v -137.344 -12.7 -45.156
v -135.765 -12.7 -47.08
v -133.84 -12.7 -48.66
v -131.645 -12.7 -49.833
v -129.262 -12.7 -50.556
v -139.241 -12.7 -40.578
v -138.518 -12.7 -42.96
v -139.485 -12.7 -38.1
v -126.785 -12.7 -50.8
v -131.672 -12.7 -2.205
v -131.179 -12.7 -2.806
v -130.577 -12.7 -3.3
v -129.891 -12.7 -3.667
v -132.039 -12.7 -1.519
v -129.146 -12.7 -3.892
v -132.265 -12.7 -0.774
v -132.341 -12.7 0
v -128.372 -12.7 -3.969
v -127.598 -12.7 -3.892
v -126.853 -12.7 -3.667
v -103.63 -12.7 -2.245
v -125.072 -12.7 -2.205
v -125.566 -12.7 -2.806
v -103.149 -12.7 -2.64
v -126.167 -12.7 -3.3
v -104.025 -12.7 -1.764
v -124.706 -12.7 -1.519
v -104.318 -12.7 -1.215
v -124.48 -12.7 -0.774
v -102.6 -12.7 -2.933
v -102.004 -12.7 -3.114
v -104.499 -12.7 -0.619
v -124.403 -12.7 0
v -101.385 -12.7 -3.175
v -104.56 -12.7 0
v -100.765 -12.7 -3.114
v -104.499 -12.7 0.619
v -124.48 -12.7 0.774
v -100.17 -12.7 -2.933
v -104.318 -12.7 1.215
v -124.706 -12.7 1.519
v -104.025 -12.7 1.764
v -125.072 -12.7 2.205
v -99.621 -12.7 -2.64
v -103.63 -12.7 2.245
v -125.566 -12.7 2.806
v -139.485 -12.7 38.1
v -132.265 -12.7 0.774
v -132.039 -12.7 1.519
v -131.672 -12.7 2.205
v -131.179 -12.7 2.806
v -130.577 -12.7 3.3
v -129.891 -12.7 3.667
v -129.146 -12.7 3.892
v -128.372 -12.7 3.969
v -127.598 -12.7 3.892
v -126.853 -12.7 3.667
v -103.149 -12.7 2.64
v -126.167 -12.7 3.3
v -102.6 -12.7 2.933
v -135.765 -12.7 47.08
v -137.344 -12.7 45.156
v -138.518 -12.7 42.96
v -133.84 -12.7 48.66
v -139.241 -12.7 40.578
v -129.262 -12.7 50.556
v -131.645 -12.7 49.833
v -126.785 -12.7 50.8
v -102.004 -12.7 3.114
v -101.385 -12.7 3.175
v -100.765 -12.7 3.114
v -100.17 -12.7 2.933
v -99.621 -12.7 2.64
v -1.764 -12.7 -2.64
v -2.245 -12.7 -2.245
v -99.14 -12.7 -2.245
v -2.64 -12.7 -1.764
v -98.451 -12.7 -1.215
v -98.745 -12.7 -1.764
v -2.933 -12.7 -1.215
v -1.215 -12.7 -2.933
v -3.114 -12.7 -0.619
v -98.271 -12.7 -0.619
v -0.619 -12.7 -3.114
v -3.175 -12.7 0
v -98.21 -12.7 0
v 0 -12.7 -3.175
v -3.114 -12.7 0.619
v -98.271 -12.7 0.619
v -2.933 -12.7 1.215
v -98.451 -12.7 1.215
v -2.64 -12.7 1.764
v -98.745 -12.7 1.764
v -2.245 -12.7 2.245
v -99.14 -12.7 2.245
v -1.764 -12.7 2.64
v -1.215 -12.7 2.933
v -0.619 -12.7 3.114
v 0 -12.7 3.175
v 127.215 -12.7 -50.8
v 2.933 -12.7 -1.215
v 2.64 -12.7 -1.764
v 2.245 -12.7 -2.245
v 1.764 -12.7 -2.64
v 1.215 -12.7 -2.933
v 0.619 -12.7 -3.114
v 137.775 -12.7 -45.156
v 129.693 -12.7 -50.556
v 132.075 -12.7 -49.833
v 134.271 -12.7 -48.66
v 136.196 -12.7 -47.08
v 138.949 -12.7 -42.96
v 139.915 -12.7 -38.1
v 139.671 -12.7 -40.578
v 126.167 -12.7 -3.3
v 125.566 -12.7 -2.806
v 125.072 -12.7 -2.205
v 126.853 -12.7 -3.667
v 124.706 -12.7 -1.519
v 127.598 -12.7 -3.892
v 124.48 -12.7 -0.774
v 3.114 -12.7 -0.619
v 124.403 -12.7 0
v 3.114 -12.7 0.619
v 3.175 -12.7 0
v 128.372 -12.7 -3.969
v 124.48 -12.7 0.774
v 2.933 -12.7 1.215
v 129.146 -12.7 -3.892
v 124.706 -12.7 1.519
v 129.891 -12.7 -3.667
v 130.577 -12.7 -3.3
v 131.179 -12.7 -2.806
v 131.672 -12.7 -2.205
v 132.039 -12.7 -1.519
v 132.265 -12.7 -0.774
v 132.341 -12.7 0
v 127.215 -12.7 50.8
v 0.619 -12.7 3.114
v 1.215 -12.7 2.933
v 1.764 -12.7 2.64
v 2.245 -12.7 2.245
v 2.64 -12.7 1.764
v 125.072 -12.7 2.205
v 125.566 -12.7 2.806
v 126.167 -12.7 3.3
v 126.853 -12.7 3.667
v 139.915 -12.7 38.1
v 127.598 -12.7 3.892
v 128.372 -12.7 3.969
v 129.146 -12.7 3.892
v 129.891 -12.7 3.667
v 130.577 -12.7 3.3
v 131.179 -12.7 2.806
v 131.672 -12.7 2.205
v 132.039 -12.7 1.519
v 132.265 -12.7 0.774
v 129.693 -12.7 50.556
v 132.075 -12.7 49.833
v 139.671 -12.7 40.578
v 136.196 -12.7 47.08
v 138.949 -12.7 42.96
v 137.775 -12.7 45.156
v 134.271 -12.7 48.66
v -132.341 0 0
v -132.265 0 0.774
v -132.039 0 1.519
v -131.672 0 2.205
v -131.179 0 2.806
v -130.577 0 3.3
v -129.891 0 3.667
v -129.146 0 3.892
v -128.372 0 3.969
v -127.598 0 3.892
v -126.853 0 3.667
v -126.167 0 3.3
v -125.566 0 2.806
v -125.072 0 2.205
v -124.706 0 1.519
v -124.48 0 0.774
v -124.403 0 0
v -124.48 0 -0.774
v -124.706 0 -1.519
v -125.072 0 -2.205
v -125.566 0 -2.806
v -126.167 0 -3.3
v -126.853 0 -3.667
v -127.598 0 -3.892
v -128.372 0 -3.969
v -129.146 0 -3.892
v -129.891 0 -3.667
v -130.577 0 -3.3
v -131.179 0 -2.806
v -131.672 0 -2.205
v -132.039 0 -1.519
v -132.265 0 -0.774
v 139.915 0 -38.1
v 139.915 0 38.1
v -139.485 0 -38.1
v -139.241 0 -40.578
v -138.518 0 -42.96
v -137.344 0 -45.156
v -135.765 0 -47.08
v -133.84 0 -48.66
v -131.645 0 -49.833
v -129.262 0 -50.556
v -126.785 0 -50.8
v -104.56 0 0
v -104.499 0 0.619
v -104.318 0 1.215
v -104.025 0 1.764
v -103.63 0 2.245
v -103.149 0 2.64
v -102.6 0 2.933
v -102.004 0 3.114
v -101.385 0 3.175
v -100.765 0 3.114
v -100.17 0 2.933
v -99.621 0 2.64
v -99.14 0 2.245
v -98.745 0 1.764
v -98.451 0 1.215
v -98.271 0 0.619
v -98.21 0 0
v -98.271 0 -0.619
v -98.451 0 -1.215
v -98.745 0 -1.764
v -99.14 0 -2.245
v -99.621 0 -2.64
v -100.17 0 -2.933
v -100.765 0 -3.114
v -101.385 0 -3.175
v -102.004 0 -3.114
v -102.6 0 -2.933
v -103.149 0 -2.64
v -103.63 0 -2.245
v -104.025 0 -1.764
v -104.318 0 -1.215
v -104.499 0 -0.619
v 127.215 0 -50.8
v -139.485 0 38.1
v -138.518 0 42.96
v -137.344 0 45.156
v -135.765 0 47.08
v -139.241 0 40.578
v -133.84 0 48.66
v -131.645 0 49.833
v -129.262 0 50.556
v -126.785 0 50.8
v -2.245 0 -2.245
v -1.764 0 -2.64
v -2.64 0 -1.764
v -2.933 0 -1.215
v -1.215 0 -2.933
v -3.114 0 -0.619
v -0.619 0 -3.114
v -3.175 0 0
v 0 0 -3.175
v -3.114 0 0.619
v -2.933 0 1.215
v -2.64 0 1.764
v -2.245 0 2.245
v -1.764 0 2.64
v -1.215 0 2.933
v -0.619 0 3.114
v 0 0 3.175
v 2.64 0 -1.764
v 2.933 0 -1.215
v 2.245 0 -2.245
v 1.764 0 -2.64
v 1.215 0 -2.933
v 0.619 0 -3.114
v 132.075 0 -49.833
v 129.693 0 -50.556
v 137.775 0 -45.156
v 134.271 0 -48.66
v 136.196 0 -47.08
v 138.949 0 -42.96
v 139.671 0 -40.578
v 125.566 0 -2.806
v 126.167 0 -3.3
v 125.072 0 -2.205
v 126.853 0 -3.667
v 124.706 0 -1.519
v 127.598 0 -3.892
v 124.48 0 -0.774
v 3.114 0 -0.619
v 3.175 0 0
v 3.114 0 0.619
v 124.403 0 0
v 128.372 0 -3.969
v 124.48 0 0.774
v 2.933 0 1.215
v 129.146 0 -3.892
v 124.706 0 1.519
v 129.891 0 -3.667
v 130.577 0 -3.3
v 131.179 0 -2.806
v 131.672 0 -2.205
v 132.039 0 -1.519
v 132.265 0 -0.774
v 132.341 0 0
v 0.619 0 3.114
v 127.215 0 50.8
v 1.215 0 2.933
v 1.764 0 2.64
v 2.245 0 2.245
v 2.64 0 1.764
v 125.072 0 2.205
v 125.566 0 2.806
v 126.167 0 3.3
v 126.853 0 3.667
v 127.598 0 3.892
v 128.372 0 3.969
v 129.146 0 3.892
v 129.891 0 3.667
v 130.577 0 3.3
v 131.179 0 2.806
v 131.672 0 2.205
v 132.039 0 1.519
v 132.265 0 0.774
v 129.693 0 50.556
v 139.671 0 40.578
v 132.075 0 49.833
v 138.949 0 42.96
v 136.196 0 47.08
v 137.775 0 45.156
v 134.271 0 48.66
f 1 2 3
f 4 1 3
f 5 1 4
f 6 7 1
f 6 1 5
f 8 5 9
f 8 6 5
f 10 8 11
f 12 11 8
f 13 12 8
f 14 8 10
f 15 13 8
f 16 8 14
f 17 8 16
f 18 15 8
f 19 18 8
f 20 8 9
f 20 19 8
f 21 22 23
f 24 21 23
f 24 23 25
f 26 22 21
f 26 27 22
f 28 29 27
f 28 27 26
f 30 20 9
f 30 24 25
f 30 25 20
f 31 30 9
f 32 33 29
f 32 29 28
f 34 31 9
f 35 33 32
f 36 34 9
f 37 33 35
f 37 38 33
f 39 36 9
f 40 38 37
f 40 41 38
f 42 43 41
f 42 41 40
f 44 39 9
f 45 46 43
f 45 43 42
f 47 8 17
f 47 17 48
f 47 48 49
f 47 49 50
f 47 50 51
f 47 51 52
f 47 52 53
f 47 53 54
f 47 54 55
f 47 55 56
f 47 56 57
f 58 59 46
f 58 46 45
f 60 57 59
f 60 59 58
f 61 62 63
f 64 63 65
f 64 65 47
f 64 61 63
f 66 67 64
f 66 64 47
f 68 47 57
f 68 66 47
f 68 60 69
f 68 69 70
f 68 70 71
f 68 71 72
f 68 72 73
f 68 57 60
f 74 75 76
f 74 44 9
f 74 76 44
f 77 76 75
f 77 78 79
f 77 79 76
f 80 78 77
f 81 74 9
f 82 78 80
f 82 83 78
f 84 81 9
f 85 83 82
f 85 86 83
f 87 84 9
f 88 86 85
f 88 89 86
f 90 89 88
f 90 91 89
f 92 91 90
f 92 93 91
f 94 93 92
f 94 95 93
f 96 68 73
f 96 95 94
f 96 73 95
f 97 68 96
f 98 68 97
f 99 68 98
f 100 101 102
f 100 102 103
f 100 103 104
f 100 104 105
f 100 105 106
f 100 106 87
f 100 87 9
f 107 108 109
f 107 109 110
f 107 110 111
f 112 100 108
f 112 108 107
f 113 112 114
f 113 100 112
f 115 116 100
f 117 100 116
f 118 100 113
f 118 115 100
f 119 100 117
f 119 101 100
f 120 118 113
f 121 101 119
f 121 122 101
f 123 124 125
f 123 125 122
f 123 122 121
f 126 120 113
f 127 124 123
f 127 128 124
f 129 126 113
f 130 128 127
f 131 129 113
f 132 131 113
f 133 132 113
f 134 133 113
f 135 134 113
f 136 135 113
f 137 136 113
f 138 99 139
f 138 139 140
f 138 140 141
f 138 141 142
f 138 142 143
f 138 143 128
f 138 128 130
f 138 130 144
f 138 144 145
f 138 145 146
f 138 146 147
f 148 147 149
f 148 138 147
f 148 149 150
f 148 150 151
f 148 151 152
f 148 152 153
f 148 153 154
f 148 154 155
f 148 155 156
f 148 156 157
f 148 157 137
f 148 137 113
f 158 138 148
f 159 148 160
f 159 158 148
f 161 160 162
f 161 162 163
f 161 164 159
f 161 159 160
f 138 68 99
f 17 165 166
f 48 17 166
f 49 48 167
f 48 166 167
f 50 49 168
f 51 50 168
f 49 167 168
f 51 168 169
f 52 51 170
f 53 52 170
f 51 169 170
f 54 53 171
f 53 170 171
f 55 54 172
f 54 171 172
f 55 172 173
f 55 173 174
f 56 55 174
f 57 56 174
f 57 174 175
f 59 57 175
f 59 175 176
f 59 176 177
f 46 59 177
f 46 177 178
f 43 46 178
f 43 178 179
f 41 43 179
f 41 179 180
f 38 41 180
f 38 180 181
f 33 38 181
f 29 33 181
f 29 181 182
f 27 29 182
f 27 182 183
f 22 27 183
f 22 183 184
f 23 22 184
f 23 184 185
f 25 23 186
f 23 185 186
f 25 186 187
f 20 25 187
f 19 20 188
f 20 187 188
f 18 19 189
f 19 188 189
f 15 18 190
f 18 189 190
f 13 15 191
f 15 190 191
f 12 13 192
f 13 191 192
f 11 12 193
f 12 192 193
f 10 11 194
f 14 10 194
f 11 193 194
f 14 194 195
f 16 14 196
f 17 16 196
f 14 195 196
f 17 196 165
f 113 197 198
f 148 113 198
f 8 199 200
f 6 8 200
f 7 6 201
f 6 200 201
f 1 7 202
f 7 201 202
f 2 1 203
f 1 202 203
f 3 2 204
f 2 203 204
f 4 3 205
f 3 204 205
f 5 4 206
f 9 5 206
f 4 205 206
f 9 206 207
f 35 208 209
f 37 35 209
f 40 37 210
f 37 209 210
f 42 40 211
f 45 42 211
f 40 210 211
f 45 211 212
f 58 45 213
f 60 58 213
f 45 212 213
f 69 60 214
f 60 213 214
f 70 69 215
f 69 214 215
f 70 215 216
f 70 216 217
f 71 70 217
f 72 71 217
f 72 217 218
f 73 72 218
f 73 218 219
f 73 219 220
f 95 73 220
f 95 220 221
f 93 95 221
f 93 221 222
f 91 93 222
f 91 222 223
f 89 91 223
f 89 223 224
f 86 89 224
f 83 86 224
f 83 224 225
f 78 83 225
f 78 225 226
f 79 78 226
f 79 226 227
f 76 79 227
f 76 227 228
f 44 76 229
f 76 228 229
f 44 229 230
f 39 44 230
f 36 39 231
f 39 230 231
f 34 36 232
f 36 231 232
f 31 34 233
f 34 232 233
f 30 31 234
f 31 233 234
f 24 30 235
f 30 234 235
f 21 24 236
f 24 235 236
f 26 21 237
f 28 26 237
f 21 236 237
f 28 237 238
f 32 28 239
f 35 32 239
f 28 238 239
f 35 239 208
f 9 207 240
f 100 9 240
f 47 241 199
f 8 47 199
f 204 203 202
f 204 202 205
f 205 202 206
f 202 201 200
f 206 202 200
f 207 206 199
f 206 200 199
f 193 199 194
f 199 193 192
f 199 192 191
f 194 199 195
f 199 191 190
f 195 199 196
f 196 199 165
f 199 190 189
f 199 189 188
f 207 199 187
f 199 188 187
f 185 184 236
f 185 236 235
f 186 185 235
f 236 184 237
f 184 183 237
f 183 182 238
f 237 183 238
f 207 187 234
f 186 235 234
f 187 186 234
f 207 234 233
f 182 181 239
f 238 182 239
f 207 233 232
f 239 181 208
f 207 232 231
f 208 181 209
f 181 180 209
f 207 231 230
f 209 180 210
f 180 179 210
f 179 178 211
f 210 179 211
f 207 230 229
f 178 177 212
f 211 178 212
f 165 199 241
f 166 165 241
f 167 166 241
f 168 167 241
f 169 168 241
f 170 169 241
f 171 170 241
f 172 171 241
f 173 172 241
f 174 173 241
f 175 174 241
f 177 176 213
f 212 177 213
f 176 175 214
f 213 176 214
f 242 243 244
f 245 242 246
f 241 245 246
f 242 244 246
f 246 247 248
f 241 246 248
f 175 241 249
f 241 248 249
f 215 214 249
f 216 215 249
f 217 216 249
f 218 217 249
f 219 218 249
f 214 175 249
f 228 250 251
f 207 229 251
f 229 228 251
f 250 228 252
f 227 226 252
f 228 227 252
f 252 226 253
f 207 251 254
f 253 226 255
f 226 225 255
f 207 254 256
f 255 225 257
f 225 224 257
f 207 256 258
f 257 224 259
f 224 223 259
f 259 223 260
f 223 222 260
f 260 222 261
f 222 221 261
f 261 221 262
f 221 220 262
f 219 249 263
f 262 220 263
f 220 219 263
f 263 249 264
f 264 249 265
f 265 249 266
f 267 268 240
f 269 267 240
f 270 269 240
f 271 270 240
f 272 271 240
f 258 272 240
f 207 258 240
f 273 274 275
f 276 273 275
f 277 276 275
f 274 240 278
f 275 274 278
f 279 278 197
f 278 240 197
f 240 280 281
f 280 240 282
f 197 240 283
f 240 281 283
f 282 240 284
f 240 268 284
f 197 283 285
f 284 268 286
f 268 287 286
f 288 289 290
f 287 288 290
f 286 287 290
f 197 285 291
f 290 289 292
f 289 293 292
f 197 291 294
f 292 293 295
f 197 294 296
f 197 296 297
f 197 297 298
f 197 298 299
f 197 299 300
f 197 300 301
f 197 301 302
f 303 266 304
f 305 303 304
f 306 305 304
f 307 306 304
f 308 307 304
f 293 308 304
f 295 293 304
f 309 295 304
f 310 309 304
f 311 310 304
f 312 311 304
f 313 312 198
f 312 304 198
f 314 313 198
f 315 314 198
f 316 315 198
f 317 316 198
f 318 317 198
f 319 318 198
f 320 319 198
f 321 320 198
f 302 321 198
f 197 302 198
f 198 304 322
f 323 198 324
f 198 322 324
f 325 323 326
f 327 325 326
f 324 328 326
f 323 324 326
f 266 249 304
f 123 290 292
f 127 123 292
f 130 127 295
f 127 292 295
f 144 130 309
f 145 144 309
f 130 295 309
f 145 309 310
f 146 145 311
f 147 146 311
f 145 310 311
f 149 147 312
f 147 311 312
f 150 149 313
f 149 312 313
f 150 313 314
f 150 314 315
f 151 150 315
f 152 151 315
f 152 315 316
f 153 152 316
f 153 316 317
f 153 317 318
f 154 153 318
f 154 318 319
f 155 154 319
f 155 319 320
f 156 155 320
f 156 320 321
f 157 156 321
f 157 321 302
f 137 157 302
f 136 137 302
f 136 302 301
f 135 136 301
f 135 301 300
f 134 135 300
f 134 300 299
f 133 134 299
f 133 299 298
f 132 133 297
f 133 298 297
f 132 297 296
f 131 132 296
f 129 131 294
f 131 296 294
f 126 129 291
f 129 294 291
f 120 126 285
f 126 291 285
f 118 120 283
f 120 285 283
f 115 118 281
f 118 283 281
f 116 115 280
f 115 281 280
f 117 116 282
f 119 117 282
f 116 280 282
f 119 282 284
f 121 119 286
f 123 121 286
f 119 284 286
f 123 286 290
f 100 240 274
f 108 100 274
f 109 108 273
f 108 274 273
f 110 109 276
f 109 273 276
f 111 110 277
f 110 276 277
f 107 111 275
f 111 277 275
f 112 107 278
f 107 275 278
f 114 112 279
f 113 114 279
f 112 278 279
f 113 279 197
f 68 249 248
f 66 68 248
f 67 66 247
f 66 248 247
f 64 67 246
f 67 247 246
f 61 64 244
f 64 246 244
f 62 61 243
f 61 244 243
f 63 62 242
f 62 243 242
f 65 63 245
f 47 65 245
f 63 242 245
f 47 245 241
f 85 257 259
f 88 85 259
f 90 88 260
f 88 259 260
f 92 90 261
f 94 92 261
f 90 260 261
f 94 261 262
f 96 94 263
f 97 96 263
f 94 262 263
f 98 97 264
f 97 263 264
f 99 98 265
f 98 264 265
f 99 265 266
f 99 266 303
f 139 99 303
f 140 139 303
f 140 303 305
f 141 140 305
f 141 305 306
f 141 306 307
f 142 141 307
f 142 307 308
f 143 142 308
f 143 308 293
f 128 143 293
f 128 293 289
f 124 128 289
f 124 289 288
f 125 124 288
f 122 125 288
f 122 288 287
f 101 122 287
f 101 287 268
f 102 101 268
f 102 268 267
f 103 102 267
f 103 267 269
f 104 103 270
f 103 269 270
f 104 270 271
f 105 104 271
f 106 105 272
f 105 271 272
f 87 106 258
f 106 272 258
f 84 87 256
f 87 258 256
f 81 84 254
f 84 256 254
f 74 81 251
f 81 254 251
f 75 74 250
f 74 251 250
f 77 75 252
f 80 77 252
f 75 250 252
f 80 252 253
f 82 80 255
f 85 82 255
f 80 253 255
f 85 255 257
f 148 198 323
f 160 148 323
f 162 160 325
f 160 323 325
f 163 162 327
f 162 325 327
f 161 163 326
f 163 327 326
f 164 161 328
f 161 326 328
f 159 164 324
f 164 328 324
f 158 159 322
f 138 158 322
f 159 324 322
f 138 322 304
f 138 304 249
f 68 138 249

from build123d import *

# Parameters (mm, degrees)
F1_DEPTH = 12.7
F3_D     = 7.9375
F5_D     = 6.35
F7_D     = 6.35


with BuildPart() as f1:
    # F0 (on Front) → F1 (new body)
    with BuildSketch(Plane.XZ):
        with BuildLine():
            Line((127.215293, 50.8), (-126.784707, 50.8))
            ThreePointArc((-126.784707, 50.8), (-135.764963, 47.080256), (-139.484707, 38.1))
            Line((-139.484707, 38.1), (-139.484707, -38.1))
            ThreePointArc((-139.484707, -38.1), (-135.764963, -47.080256), (-126.784707, -50.8))
            Line((-126.784707, -50.8), (127.215293, -50.8))
            ThreePointArc((127.215293, -50.8), (136.195549, -47.080256), (139.915293, -38.1))
            Line((139.915293, -38.1), (139.915293, 38.1))
            ThreePointArc((139.915293, 38.1), (136.195549, 47.080256), (127.215293, 50.8))
        make_face()
    extrude(amount=F1_DEPTH)

    # F3 (through all)
    with Locations(Plane.XZ.offset(12.7)):
        with Locations((-128.372207, 0), (128.372207, 0)):
            Hole(F3_D / 2)

    # F5 (through all)
    with Locations(Plane.XZ.offset(12.7)):
        with Locations((-101.384707, 0)):
            Hole(F5_D / 2)

    # F7 (through all)
    with Locations(Plane.XZ.offset(12.7)):
        with Locations((0, 0)):
            Hole(F7_D / 2)


solid = f1.part
